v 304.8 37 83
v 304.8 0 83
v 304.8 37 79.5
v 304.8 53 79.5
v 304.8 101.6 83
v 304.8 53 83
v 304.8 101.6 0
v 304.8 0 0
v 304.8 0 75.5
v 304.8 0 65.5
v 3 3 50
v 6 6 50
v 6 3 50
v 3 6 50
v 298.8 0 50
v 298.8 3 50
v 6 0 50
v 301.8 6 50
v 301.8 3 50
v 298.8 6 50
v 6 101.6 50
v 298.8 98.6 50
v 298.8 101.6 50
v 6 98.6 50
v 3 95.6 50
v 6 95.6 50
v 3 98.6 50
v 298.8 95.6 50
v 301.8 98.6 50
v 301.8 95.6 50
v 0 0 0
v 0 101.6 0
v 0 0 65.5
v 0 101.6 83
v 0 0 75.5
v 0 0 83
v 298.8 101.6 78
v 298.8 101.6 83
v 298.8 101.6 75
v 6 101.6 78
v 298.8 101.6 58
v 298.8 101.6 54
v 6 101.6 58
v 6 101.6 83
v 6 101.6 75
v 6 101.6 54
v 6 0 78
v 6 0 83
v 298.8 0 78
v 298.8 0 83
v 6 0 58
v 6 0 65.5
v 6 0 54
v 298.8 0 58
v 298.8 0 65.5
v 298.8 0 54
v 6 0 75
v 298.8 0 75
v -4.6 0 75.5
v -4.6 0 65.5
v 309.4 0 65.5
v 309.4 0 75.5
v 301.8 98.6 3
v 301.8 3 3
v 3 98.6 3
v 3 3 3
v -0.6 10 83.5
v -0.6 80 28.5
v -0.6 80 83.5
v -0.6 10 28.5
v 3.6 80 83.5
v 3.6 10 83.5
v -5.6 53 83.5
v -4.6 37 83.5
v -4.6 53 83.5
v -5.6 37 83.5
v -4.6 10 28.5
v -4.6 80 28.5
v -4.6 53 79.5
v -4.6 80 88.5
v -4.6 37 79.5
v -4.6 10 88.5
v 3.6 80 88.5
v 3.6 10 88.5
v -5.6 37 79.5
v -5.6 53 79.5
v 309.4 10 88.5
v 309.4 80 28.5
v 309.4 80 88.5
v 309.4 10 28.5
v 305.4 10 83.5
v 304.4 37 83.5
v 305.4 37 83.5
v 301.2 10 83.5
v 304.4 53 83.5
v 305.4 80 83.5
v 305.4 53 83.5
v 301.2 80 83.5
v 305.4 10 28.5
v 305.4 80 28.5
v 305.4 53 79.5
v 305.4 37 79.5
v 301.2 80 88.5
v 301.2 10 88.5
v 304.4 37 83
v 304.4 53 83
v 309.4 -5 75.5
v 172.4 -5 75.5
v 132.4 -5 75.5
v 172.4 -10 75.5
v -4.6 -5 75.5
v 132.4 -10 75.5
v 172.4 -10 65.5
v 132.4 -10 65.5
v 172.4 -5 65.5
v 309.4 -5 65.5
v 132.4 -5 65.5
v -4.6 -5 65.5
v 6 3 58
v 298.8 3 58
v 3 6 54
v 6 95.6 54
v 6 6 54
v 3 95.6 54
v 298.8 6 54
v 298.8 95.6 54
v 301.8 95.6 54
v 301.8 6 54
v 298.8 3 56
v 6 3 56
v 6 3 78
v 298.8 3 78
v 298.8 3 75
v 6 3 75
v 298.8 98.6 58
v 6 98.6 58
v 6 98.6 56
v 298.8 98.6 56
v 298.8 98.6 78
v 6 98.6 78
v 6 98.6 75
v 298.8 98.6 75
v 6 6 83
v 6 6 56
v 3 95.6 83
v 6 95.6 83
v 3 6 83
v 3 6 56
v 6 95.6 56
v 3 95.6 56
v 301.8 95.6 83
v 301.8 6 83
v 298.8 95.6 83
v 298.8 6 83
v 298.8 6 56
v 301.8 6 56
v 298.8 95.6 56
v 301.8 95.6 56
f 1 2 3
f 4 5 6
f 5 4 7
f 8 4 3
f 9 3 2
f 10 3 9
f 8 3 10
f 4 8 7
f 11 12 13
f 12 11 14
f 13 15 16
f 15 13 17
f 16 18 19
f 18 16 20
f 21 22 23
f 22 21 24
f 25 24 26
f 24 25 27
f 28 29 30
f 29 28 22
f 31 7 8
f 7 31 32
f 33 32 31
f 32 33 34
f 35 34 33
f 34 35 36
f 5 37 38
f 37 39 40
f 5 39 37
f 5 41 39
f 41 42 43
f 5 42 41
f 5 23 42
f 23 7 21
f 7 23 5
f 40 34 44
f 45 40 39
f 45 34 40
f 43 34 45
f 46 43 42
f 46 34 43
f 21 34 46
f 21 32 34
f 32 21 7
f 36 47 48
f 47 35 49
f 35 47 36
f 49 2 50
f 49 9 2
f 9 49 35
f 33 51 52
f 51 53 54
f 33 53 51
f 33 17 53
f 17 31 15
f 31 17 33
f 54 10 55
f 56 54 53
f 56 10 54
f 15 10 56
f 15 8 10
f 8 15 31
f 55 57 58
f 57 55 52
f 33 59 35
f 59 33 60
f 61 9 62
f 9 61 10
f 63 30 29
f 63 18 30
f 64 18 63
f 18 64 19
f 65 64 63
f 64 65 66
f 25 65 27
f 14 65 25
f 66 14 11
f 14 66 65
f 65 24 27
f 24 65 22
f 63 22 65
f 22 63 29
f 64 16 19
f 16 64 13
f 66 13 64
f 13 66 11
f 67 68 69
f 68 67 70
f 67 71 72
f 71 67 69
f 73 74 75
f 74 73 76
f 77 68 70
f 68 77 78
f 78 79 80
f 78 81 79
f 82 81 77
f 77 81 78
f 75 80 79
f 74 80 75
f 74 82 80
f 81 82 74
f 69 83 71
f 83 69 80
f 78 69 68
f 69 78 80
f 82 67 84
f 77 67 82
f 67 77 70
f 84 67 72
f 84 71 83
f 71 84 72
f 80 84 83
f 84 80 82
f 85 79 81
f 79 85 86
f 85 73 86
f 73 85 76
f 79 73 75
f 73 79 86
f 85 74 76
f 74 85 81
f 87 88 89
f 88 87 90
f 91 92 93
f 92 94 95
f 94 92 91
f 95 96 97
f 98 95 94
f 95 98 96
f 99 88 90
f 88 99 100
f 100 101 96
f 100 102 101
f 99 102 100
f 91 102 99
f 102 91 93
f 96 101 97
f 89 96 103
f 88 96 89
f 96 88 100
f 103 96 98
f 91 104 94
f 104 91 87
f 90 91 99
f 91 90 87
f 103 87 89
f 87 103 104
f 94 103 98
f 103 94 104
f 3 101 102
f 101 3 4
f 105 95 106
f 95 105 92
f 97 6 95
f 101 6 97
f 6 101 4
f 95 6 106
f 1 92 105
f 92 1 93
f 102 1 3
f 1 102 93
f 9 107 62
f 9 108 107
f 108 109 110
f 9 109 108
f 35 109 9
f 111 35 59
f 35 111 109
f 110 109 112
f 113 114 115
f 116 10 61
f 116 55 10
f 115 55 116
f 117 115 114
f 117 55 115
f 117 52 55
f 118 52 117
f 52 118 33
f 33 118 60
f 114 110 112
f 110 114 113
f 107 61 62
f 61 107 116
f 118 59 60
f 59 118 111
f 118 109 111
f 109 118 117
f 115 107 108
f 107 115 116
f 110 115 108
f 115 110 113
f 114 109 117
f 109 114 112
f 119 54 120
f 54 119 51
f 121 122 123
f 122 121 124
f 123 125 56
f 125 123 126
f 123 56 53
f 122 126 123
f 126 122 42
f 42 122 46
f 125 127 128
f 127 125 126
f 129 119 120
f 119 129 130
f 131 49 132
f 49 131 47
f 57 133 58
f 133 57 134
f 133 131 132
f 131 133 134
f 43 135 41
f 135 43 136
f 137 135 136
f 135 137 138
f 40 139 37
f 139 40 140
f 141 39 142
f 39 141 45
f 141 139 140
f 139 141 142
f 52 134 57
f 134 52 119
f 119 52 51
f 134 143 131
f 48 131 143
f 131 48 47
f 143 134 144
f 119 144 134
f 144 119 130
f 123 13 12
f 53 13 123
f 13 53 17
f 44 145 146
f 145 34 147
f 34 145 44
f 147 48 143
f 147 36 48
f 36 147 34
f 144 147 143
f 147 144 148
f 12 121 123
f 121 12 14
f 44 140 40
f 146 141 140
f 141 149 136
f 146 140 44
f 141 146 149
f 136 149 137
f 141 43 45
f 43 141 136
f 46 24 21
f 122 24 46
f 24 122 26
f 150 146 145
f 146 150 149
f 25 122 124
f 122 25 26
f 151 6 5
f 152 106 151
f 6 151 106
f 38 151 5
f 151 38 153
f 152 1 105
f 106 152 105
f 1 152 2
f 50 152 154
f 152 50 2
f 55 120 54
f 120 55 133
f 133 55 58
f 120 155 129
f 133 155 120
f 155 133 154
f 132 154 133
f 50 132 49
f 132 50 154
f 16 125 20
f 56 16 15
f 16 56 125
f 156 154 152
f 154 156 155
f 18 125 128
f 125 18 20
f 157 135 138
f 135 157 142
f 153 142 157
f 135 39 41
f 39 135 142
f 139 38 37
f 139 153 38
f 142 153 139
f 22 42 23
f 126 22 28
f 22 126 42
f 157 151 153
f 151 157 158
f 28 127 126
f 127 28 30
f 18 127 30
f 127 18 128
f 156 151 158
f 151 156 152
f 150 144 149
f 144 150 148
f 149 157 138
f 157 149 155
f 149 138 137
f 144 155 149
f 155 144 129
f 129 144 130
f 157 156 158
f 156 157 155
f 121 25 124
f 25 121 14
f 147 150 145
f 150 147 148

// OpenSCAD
// file: ../top_ref.scad
// top_ref.scad  — FAITHFUL reference of the real uploaded top tray (L3.stl)
// Extracted from L3.stl by voxel analysis. Coordinates: new-tray top face = z=0 here,
// call top_ref(base=50) to seat it on a 50mm-tall new tray.
// DO NOT MODIFY THIS PART IN ANY DESIGN — it represents an already-printed tray.
//
// Real dims: 304.8 (X) x 101.6 (Y) x 33 (Z).
//  - END walls (short, x=0..3 and 301.8..304.8): SOLID full height -> top at z=33 (seated 83)
//  - LONG sides (front y=0..3, back y=98.6..101.6): OPEN FRAME
//        bottom rail z=4..8, top rail z=25..28, OPEN between (z=9..24)
//        side top edge at z=28 (seated 78)
//  - Corners: full height to z=33 (seated 83)
//  - Floor plate: z=4..6
// Seated mapping (base=50): add 50 to every z below.

TR_X = 304.8;
TR_Y = 101.6;
TR_Z = 33;
TR_wall = 3;        // side/end wall thickness
TR_endw = 3;        // short-end wall thickness
TR_botrail_z0 = 4;  TR_botrail_z1 = 8;     // long-side bottom rail
TR_toprail_z0 = 25; TR_toprail_z1 = 28;    // long-side top rail (side top edge=28)
TR_floor_z0 = 4;    TR_floor_z1 = 6;
TR_corner = 6;      // corner post footprint (x & y) kept full height

module top_ref(base=50, col="#90A4AE", alpha=1.0) {
    color(col, alpha)
    translate([0,0,base])
    union() {
        // ---- floor plate ----
        translate([TR_endw, TR_wall, TR_floor_z0])
            cube([TR_X-2*TR_endw, TR_Y-2*TR_wall, TR_floor_z1-TR_floor_z0]);
        // ---- two short END walls: full height ----
        cube([TR_endw, TR_Y, TR_Z]);
        translate([TR_X-TR_endw,0,0]) cube([TR_endw, TR_Y, TR_Z]);
        // ---- long-side OPEN FRAMES (front & back) ----
        for (yy=[0, TR_Y-TR_wall]) {
            // bottom rail
            translate([0, yy, TR_botrail_z0]) cube([TR_X, TR_wall, TR_botrail_z1-TR_botrail_z0]);
            // top rail (side top edge)
            translate([0, yy, TR_toprail_z0]) cube([TR_X, TR_wall, TR_toprail_z1-TR_toprail_z0]);
        }
        // ---- corner posts full height (tie frames together, reach z=33) ----
        for (xx=[0, TR_X-TR_corner], yy=[0, TR_Y-TR_corner])
            translate([xx,yy,0]) cube([TR_corner, TR_corner, TR_Z]);
    }
}

// Convenience constants a design can reference (seated, base=50):
//   END-wall top edge:        z = 50+33 = 83  (over the short ends -> strong clamp)
//   Long-side top rail top:   z = 50+28 = 78  (hook over / under along front)
//   Long-side open slot:      z = 50+9 .. 50+24 = 59..74 (reach a tongue in anywhere)
//   Corner top:               z = 83
// main file
// 02_linked_clamp.scad
// WILDCARD variant 2: LINKED CLAMP with SPINE BAR — single push locks both ends
//
// Refinement over 01: the two L-jaw clamps are now linked by a horizontal
// SPINE BAR running along the FRONT face (y<0, z below tray top). Pushing
// the spine bar UP simultaneously drives both clamps upward — truly a
// single-motion lock.  A snap-detent ridge on each clamp arm holds the
// locked position.
//
// The spine bar is at y<0 (in front of new tray), so it stays clear of the
// top tray geometry while also being below z=83 (unlocked overhead constraint).
//
// Additional feature: the spine bar has a CENTER PUSH BOSS — a large ribbed
// thumb area to push with one finger.

show = "all"; // [all,new,top]
lock = 1;

include <../top_ref.scad>

$fn = 48;

NTX = 304.8;  NTY = 101.6;  NTZ = 50;  WALL = 3;
END_WALL_T = 3;
END_TOP_Z  = 83;

// Jaw geometry (same principle as variant 1)
JAW_T      = 4;
JAW_GAP    = 0.6;
JAW_YW     = 70;      // jaw width in Y
JAW_Y0     = 10;      // jaw starts y=10
JAW_H_OUTER = 55;     // stem height
HOOK_H      = 5;      // hook nose height
JAW_HOOK_Z_UNLOCK = 40;
JAW_HOOK_Z_LOCK   = 83.5;

// Spine bar
SPINE_H   = 10;    // spine bar height in Z
SPINE_T   = 5;     // spine bar thickness in Y (protrudes forward from tray)
SPINE_Z0_UNLOCK = 22;  // spine bottom z when unlocked (stow low)
SPINE_Z0_LOCK   = 22 + (JAW_HOOK_Z_LOCK - JAW_HOOK_Z_UNLOCK);  // = 22 + 43.5 = 65.5
// Spine z top: unlock=32 (below z=50 ✓), lock=75.5 (above z=50, enters front slot)

// For capture: spine at y=-(SPINE_T)..-0 is outside the top tray.
// The top tray front slot (z=59..74) is at y=0..3. Spine at y<0 doesn't enter it.
// Spine is for DRIVING only, not for capture. Capture is still via end hooks.

module new_tray() {
    color("#1565C0")
    difference() {
        cube([NTX, NTY, NTZ]);
        translate([WALL, WALL, WALL])
            cube([NTX-2*WALL, NTY-2*WALL, NTZ-WALL+0.1]);
    }
}

module l_jaw(side, lock_state) {
    hook_z  = lock_state==1 ? JAW_HOOK_Z_LOCK : JAW_HOOK_Z_UNLOCK;
    outer_z0 = hook_z - JAW_H_OUTER;
    of_x    = side==0 ? -(JAW_T+JAW_GAP) : NTX+JAW_GAP;
    hook_x0 = side==0 ? -(JAW_T+JAW_GAP) : NTX-END_WALL_T-JAW_GAP;
    hook_xw = JAW_T + END_WALL_T + 2*JAW_GAP;

    color("#D84315")
    translate([0, JAW_Y0, 0])
    union() {
        // Vertical stem
        translate([of_x, 0, outer_z0])
            cube([JAW_T, JAW_YW, JAW_H_OUTER]);
        // Hook nose
        translate([hook_x0, 0, hook_z])
            cube([hook_xw, JAW_YW, HOOK_H]);
        // Snap detent ridge (small bump that catches on tray edge in locked pos)
        // A ridge at z = hook_z - 3 that is 1mm proud on outer face
        translate([of_x - 1, JAW_YW/2-8, hook_z - 4])
            cube([1.5, 16, 4]);
        // Connector tab to spine bar (at front of stem, y=0 face of stem)
        translate([of_x, 0, outer_z0 + JAW_H_OUTER/2 - SPINE_H/2])
            cube([JAW_T, 2, SPINE_H]);
    }
}

module spine_bar(lock_state) {
    sz0 = lock_state==1 ? SPINE_Z0_LOCK : SPINE_Z0_UNLOCK;
    color("#D84315")
    union() {
        // Main bar spanning between jaws
        translate([-(JAW_T+JAW_GAP), -(SPINE_T), sz0])
            cube([NTX + 2*(JAW_T+JAW_GAP), SPINE_T, SPINE_H]);
        // Center push boss (ribbed thumb push area)
        translate([NTX/2 - 20, -(SPINE_T+5), sz0])
            cube([40, SPINE_T+5, SPINE_H]);
        // Ribs on push boss
        for (rx = [-12, -4, 4, 12]) {
            translate([NTX/2 + rx - 1, -(SPINE_T+5), sz0])
                cube([2, 5, SPINE_H]);
        }
    }
}

module new_assembly(lock_state) {
    new_tray();
    l_jaw(0, lock_state);
    l_jaw(1, lock_state);
    spine_bar(lock_state);
}

if (show != "top") new_assembly(lock);
if (show != "new") top_ref(50);
